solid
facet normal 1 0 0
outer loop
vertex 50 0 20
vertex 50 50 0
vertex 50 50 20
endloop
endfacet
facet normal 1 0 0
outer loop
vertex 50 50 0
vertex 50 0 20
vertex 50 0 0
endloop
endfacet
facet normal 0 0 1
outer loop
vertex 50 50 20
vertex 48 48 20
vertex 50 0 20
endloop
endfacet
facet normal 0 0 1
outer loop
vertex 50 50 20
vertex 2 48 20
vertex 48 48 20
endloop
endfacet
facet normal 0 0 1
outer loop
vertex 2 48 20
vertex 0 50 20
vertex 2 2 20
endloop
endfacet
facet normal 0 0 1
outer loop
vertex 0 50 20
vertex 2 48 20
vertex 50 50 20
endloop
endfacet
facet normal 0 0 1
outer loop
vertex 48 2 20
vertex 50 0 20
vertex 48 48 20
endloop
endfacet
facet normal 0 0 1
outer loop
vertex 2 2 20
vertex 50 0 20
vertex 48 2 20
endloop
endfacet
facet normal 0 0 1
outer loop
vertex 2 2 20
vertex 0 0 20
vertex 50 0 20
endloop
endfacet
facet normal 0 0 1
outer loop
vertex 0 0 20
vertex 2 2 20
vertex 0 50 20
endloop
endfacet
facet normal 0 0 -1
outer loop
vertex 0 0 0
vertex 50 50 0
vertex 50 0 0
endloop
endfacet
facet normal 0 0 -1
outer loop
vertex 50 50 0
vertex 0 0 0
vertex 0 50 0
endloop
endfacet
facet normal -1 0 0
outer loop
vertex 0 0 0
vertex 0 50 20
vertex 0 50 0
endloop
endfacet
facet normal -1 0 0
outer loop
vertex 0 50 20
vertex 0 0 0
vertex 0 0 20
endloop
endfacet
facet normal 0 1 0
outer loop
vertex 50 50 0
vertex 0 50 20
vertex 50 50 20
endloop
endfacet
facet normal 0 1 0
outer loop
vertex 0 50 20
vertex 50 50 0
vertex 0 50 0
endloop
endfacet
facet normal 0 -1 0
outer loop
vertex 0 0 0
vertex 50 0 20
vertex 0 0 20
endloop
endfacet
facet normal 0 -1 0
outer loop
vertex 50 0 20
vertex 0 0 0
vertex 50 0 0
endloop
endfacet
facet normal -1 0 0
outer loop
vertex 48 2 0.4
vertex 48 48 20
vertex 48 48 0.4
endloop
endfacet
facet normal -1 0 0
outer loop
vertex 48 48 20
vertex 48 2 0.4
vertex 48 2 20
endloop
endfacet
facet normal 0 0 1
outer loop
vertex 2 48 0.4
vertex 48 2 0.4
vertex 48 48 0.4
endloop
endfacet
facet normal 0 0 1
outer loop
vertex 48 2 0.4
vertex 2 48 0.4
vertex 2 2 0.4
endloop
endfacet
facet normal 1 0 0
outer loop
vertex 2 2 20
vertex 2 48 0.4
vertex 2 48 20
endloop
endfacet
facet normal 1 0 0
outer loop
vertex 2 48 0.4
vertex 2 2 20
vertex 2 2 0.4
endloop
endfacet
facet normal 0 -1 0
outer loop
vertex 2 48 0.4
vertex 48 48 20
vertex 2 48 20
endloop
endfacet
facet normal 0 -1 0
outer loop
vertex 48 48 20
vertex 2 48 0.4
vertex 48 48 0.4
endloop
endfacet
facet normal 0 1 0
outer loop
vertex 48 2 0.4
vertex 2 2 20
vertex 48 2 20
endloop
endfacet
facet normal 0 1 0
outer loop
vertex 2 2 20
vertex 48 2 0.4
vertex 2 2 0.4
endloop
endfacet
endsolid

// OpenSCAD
module adhesion_test()
{
  size = [50, 50, 20];
  wall = 2;
  base = 0.4;
  difference()
  {
    cube(size);
    translate([wall, wall, base])
      cube(size - wall*[2,2,0]);
  }
}


adhesion_test();
